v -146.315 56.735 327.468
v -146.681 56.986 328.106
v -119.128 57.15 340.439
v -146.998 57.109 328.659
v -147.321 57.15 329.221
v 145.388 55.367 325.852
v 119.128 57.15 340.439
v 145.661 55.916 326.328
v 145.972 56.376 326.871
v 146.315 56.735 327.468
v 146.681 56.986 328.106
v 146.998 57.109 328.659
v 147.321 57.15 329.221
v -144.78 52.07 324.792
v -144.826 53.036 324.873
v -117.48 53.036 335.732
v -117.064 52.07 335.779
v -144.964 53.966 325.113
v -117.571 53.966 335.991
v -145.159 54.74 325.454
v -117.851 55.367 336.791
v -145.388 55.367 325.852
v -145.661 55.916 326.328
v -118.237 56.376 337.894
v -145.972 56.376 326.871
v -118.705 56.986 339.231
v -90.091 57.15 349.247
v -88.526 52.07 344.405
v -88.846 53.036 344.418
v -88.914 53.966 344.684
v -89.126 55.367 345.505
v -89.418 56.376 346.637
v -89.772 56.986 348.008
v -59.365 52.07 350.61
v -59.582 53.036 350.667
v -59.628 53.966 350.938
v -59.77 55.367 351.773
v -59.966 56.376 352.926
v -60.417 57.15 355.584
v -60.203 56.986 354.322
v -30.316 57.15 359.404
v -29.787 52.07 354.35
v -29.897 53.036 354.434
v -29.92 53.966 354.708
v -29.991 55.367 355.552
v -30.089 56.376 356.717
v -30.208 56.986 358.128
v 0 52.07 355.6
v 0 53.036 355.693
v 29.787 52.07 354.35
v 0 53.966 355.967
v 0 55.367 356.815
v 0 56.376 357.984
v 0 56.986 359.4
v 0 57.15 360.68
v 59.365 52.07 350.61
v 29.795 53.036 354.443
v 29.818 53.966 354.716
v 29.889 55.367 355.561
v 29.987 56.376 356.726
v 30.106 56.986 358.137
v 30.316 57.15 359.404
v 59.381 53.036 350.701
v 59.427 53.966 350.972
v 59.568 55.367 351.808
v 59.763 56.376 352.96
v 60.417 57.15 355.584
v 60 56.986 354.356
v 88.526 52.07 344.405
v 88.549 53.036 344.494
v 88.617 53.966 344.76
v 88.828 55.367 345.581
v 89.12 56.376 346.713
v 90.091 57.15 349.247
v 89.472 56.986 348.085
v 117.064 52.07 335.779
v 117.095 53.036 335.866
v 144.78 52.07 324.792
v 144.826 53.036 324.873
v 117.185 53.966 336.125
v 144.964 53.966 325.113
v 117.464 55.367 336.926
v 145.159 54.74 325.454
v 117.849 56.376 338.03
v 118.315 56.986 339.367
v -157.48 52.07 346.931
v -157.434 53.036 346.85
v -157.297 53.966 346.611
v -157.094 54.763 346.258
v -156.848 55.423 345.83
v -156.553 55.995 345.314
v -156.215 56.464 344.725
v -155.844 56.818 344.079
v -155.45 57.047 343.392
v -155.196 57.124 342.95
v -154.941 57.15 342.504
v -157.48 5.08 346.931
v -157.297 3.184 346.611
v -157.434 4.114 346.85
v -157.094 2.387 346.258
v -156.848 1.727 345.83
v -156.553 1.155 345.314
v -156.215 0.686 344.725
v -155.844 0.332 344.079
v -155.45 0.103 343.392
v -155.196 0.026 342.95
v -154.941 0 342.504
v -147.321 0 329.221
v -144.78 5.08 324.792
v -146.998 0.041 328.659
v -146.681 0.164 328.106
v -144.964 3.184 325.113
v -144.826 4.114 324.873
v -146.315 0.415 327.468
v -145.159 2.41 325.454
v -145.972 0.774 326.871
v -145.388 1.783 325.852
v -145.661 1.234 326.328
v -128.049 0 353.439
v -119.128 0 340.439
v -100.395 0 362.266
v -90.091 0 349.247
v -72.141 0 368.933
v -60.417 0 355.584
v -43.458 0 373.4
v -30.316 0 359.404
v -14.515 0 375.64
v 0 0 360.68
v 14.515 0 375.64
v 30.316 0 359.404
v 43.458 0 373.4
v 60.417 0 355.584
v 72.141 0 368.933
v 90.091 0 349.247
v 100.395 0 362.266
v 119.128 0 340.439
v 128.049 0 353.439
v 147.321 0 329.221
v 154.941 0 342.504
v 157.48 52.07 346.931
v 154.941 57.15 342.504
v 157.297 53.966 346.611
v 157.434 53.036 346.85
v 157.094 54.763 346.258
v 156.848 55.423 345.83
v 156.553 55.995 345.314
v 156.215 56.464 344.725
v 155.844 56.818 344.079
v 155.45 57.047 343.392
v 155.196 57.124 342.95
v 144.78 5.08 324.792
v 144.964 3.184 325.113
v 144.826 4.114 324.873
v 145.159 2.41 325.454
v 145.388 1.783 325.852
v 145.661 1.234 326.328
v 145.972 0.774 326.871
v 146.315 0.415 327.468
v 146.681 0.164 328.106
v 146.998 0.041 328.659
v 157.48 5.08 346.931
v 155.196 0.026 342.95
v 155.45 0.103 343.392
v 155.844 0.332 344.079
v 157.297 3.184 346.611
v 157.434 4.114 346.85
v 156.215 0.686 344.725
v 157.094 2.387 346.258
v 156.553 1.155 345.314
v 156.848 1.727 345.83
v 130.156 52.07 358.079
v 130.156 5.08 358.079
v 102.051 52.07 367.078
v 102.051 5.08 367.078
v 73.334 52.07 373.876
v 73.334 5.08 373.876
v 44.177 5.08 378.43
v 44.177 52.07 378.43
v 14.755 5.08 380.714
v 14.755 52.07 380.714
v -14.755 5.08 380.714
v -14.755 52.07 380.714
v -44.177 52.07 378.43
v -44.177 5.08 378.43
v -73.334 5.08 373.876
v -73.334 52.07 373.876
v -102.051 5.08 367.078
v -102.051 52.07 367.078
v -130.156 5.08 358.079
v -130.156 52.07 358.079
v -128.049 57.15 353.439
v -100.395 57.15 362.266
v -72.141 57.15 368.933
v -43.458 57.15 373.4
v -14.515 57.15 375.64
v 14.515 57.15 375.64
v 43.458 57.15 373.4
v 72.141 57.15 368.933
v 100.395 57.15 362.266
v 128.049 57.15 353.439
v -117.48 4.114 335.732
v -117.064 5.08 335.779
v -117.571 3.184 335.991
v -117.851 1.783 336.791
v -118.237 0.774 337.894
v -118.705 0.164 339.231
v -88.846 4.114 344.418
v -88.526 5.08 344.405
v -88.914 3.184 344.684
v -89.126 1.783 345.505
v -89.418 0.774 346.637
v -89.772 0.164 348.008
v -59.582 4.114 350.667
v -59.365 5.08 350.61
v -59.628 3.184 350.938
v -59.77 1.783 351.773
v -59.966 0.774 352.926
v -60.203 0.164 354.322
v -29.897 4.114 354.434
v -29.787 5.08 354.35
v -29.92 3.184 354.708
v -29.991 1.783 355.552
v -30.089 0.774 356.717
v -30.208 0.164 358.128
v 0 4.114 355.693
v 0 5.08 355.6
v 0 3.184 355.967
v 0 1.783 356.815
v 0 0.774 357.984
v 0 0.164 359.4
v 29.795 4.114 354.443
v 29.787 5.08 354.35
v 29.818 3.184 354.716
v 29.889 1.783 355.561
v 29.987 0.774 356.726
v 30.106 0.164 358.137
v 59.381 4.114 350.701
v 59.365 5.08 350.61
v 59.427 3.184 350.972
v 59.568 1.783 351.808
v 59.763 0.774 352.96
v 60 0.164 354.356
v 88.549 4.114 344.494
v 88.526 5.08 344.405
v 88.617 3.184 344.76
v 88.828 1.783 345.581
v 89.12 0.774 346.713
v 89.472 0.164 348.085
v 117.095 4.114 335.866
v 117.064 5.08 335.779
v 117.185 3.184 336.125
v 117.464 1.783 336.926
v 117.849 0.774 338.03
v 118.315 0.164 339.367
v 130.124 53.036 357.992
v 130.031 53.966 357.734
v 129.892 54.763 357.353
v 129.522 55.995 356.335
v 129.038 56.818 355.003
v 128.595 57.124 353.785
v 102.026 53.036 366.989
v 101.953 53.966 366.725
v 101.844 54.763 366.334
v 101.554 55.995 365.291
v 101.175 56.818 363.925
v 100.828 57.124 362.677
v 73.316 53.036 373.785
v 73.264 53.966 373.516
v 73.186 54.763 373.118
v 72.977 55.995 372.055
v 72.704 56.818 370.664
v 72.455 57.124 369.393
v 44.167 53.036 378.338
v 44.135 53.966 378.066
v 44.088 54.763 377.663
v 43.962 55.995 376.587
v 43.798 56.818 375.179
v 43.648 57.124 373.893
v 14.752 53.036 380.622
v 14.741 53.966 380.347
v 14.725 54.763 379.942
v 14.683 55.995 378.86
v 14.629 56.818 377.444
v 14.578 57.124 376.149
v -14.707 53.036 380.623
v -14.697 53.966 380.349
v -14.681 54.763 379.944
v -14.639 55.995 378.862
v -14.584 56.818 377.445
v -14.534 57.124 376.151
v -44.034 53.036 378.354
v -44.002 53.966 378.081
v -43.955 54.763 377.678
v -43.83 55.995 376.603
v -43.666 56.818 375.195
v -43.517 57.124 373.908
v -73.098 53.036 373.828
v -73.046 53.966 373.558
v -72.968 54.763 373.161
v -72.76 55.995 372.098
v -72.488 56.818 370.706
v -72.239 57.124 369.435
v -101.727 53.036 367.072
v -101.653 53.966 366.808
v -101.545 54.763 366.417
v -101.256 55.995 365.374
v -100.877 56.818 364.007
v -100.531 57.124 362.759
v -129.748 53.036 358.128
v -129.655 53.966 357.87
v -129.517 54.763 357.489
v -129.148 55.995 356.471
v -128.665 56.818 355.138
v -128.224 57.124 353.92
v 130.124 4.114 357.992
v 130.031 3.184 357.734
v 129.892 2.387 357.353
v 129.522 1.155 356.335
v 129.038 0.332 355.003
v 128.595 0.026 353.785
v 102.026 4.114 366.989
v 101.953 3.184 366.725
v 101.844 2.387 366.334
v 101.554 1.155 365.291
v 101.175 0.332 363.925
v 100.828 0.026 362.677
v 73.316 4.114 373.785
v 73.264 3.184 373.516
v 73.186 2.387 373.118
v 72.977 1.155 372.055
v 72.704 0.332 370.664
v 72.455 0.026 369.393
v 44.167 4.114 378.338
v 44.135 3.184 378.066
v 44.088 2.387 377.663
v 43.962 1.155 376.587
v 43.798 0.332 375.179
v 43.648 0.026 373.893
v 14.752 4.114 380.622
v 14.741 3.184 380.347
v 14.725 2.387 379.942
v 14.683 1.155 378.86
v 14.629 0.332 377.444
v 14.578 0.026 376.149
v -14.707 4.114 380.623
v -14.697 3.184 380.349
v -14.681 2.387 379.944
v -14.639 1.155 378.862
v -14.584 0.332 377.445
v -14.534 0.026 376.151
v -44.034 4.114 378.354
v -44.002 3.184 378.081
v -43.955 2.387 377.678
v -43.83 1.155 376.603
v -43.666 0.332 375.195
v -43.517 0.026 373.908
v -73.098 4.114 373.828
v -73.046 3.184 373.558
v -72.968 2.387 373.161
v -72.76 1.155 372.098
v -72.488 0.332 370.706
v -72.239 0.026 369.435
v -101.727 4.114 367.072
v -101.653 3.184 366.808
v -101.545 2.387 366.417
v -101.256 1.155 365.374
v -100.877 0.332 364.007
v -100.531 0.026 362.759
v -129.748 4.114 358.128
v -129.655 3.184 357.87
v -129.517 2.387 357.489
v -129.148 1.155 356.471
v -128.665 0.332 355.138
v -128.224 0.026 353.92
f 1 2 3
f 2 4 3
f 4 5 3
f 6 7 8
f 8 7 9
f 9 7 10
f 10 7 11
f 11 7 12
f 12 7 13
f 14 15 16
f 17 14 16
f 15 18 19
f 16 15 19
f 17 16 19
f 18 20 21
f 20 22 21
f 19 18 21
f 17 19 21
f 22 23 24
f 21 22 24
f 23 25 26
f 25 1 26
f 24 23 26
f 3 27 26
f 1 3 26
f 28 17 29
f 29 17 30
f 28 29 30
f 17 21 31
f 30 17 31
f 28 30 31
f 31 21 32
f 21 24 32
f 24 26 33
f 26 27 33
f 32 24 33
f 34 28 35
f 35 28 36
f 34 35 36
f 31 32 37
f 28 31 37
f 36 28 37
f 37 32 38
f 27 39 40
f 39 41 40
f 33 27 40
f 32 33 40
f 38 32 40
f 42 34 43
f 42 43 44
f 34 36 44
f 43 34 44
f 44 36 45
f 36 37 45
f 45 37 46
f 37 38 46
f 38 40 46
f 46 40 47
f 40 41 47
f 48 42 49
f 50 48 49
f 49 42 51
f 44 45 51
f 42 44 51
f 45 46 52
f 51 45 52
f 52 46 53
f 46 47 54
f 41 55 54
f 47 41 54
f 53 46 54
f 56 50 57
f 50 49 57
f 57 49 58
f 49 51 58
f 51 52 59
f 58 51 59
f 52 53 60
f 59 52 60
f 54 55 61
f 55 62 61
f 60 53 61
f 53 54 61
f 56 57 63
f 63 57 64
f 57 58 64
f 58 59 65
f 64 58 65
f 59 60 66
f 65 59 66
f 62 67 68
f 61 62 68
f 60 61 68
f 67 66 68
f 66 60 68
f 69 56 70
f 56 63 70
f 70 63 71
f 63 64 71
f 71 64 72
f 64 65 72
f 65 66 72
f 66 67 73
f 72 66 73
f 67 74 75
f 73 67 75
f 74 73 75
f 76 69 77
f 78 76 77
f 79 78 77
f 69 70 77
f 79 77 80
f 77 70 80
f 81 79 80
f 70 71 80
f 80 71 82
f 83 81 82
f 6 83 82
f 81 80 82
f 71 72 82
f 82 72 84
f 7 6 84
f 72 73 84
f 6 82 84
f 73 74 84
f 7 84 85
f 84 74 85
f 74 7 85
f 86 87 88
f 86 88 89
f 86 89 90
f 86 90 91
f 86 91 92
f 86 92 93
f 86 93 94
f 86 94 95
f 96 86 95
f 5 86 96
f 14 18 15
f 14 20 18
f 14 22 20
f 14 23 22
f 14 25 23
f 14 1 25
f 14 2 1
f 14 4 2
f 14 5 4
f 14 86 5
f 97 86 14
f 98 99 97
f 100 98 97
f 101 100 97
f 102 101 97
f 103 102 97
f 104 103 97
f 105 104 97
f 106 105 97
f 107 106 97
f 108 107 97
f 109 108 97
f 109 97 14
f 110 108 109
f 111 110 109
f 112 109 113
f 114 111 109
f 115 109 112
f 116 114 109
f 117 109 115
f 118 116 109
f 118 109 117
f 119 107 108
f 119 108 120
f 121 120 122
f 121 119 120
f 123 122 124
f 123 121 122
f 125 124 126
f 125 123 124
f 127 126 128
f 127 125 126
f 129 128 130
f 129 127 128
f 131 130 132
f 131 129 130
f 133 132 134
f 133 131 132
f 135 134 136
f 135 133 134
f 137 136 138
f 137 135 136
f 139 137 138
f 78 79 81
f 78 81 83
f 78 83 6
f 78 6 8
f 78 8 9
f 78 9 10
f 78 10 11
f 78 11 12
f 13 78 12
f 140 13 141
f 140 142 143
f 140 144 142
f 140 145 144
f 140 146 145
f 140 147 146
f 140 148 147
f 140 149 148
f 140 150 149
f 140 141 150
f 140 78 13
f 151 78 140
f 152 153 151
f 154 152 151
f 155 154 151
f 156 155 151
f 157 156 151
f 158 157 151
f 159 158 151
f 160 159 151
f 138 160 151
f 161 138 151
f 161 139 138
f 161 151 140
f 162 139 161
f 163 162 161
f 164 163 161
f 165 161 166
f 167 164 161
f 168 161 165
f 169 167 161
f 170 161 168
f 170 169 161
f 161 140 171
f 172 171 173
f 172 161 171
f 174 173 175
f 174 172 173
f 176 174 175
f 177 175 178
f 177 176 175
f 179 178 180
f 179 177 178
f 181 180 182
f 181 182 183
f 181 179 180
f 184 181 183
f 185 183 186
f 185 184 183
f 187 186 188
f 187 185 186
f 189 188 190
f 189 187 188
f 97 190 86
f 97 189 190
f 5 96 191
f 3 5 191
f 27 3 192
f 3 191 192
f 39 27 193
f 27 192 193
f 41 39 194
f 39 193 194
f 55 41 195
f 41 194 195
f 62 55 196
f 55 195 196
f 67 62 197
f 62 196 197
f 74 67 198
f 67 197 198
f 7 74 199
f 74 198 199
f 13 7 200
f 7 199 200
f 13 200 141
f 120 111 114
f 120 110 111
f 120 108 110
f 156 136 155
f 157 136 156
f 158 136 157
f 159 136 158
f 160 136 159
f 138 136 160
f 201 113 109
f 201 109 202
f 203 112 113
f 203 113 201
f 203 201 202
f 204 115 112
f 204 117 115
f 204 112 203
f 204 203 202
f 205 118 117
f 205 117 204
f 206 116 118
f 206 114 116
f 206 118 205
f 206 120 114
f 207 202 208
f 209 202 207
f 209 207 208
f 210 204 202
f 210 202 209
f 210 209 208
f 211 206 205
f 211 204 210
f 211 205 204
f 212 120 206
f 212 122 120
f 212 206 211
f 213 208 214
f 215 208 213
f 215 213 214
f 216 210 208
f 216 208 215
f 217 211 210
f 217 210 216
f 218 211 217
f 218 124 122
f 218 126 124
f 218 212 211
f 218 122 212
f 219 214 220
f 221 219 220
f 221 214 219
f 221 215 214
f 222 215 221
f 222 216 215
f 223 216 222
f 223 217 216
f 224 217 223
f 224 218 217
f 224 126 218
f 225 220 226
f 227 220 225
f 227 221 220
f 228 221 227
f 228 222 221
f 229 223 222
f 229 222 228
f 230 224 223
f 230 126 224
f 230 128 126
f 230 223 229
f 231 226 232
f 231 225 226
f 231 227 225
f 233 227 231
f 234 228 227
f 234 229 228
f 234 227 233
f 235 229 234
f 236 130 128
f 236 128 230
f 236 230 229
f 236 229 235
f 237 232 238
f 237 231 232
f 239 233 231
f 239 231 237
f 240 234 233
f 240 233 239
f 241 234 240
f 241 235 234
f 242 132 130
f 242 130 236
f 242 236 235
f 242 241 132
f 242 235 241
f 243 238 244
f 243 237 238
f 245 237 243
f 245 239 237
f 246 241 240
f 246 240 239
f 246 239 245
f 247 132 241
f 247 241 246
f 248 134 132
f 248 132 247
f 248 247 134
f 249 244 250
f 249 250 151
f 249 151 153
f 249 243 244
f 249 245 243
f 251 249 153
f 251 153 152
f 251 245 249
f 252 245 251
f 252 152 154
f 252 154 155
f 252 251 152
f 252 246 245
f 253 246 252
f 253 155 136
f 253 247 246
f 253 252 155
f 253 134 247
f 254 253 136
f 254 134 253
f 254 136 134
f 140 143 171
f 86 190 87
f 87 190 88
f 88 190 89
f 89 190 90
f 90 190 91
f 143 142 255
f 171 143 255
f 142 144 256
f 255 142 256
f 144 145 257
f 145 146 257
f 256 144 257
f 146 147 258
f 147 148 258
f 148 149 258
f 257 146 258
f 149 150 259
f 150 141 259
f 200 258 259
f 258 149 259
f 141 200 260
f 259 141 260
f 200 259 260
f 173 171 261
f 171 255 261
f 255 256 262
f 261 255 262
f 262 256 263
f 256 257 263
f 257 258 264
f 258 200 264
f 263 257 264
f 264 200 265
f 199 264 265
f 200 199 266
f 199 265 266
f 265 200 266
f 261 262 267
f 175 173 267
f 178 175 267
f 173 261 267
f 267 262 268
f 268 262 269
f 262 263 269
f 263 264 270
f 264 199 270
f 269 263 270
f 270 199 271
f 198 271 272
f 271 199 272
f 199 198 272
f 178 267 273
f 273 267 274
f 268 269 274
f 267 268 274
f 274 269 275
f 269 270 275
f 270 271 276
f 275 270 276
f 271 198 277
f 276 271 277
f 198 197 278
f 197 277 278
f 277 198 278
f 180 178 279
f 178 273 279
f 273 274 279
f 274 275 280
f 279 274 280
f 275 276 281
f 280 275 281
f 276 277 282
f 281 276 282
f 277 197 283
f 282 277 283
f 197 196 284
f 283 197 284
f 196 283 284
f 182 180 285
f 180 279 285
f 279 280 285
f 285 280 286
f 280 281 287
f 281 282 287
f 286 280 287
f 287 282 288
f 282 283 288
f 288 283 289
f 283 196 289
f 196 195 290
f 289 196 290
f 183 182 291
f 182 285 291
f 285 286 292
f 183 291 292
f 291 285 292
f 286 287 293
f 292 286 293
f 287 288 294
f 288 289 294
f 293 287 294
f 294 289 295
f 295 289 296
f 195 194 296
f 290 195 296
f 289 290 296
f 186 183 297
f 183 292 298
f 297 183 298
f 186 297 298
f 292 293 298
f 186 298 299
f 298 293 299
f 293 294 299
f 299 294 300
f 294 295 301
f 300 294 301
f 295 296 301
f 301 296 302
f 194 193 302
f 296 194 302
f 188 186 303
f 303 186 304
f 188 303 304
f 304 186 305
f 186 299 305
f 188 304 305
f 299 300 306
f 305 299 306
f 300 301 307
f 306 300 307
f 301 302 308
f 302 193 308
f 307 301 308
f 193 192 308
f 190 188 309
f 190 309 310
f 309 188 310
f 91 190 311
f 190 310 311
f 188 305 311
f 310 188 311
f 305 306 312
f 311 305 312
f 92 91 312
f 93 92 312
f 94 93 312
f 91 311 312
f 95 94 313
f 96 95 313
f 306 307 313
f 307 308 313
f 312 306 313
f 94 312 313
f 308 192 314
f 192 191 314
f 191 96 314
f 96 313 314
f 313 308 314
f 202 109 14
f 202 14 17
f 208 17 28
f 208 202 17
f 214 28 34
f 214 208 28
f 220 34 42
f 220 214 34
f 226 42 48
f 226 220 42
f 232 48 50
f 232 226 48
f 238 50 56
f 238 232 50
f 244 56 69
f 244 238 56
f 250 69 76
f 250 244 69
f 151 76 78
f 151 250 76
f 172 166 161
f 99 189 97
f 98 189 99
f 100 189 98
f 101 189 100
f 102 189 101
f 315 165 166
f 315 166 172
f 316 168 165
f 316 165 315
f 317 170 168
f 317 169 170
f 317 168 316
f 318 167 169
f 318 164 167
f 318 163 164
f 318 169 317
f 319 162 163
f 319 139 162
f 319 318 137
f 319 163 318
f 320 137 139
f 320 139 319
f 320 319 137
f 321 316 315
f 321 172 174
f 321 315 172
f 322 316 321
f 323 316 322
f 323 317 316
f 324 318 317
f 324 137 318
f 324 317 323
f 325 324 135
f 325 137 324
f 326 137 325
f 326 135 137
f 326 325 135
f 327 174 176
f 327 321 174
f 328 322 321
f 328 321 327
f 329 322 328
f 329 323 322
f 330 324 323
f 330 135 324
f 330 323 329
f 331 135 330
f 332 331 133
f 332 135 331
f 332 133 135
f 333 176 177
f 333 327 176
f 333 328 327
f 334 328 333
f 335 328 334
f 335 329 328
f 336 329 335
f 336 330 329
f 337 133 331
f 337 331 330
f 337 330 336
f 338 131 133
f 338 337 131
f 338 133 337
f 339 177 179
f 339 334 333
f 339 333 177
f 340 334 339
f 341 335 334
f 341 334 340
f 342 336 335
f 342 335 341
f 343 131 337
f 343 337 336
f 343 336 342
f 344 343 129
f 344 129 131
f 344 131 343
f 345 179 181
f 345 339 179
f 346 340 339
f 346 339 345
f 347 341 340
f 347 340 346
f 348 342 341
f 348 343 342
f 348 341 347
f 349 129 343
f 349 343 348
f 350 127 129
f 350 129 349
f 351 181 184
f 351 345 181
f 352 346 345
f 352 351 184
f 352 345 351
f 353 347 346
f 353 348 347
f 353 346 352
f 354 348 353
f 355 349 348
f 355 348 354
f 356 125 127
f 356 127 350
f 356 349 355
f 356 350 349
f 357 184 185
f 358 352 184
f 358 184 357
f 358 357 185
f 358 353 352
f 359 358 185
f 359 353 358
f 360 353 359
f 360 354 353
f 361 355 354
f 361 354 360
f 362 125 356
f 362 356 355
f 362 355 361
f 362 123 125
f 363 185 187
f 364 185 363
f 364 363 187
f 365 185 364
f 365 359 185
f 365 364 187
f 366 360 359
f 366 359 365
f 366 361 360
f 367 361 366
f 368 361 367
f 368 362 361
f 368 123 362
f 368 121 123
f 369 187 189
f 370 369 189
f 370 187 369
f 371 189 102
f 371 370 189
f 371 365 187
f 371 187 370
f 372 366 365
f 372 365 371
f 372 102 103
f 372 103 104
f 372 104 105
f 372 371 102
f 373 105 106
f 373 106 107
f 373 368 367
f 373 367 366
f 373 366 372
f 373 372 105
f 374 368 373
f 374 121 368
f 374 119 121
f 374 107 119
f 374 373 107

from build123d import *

# Parameters (mm, degrees)
F1_DEPTH = 57.15
F2_R     = 5.08


with BuildPart() as f1:
    # F0 (on Front) → F1 (new body)
    with BuildSketch(Plane.XZ):
        with BuildLine():
            Line((144.78, 324.792413), (157.48, 346.9309))
            ThreePointArc((157.48, 346.9309), (0, 381), (-157.48, 346.9309))
            Line((-157.48, 346.9309), (-144.78, 324.792413))
            ThreePointArc((-144.78, 324.792413), (0, 355.6), (144.78, 324.792413))
        make_face()
    extrude(amount=-F1_DEPTH)

    # F2
    f2_edges = [f1.edges().sort_by_distance(p)[0] for p in [
        (0, 0, 355.6),
        (0, 0, 381),
        (0, 57.15, 381),
        (0, 57.15, 355.6),
    ]]
    fillet(f2_edges, radius=F2_R)


solid = f1.part
